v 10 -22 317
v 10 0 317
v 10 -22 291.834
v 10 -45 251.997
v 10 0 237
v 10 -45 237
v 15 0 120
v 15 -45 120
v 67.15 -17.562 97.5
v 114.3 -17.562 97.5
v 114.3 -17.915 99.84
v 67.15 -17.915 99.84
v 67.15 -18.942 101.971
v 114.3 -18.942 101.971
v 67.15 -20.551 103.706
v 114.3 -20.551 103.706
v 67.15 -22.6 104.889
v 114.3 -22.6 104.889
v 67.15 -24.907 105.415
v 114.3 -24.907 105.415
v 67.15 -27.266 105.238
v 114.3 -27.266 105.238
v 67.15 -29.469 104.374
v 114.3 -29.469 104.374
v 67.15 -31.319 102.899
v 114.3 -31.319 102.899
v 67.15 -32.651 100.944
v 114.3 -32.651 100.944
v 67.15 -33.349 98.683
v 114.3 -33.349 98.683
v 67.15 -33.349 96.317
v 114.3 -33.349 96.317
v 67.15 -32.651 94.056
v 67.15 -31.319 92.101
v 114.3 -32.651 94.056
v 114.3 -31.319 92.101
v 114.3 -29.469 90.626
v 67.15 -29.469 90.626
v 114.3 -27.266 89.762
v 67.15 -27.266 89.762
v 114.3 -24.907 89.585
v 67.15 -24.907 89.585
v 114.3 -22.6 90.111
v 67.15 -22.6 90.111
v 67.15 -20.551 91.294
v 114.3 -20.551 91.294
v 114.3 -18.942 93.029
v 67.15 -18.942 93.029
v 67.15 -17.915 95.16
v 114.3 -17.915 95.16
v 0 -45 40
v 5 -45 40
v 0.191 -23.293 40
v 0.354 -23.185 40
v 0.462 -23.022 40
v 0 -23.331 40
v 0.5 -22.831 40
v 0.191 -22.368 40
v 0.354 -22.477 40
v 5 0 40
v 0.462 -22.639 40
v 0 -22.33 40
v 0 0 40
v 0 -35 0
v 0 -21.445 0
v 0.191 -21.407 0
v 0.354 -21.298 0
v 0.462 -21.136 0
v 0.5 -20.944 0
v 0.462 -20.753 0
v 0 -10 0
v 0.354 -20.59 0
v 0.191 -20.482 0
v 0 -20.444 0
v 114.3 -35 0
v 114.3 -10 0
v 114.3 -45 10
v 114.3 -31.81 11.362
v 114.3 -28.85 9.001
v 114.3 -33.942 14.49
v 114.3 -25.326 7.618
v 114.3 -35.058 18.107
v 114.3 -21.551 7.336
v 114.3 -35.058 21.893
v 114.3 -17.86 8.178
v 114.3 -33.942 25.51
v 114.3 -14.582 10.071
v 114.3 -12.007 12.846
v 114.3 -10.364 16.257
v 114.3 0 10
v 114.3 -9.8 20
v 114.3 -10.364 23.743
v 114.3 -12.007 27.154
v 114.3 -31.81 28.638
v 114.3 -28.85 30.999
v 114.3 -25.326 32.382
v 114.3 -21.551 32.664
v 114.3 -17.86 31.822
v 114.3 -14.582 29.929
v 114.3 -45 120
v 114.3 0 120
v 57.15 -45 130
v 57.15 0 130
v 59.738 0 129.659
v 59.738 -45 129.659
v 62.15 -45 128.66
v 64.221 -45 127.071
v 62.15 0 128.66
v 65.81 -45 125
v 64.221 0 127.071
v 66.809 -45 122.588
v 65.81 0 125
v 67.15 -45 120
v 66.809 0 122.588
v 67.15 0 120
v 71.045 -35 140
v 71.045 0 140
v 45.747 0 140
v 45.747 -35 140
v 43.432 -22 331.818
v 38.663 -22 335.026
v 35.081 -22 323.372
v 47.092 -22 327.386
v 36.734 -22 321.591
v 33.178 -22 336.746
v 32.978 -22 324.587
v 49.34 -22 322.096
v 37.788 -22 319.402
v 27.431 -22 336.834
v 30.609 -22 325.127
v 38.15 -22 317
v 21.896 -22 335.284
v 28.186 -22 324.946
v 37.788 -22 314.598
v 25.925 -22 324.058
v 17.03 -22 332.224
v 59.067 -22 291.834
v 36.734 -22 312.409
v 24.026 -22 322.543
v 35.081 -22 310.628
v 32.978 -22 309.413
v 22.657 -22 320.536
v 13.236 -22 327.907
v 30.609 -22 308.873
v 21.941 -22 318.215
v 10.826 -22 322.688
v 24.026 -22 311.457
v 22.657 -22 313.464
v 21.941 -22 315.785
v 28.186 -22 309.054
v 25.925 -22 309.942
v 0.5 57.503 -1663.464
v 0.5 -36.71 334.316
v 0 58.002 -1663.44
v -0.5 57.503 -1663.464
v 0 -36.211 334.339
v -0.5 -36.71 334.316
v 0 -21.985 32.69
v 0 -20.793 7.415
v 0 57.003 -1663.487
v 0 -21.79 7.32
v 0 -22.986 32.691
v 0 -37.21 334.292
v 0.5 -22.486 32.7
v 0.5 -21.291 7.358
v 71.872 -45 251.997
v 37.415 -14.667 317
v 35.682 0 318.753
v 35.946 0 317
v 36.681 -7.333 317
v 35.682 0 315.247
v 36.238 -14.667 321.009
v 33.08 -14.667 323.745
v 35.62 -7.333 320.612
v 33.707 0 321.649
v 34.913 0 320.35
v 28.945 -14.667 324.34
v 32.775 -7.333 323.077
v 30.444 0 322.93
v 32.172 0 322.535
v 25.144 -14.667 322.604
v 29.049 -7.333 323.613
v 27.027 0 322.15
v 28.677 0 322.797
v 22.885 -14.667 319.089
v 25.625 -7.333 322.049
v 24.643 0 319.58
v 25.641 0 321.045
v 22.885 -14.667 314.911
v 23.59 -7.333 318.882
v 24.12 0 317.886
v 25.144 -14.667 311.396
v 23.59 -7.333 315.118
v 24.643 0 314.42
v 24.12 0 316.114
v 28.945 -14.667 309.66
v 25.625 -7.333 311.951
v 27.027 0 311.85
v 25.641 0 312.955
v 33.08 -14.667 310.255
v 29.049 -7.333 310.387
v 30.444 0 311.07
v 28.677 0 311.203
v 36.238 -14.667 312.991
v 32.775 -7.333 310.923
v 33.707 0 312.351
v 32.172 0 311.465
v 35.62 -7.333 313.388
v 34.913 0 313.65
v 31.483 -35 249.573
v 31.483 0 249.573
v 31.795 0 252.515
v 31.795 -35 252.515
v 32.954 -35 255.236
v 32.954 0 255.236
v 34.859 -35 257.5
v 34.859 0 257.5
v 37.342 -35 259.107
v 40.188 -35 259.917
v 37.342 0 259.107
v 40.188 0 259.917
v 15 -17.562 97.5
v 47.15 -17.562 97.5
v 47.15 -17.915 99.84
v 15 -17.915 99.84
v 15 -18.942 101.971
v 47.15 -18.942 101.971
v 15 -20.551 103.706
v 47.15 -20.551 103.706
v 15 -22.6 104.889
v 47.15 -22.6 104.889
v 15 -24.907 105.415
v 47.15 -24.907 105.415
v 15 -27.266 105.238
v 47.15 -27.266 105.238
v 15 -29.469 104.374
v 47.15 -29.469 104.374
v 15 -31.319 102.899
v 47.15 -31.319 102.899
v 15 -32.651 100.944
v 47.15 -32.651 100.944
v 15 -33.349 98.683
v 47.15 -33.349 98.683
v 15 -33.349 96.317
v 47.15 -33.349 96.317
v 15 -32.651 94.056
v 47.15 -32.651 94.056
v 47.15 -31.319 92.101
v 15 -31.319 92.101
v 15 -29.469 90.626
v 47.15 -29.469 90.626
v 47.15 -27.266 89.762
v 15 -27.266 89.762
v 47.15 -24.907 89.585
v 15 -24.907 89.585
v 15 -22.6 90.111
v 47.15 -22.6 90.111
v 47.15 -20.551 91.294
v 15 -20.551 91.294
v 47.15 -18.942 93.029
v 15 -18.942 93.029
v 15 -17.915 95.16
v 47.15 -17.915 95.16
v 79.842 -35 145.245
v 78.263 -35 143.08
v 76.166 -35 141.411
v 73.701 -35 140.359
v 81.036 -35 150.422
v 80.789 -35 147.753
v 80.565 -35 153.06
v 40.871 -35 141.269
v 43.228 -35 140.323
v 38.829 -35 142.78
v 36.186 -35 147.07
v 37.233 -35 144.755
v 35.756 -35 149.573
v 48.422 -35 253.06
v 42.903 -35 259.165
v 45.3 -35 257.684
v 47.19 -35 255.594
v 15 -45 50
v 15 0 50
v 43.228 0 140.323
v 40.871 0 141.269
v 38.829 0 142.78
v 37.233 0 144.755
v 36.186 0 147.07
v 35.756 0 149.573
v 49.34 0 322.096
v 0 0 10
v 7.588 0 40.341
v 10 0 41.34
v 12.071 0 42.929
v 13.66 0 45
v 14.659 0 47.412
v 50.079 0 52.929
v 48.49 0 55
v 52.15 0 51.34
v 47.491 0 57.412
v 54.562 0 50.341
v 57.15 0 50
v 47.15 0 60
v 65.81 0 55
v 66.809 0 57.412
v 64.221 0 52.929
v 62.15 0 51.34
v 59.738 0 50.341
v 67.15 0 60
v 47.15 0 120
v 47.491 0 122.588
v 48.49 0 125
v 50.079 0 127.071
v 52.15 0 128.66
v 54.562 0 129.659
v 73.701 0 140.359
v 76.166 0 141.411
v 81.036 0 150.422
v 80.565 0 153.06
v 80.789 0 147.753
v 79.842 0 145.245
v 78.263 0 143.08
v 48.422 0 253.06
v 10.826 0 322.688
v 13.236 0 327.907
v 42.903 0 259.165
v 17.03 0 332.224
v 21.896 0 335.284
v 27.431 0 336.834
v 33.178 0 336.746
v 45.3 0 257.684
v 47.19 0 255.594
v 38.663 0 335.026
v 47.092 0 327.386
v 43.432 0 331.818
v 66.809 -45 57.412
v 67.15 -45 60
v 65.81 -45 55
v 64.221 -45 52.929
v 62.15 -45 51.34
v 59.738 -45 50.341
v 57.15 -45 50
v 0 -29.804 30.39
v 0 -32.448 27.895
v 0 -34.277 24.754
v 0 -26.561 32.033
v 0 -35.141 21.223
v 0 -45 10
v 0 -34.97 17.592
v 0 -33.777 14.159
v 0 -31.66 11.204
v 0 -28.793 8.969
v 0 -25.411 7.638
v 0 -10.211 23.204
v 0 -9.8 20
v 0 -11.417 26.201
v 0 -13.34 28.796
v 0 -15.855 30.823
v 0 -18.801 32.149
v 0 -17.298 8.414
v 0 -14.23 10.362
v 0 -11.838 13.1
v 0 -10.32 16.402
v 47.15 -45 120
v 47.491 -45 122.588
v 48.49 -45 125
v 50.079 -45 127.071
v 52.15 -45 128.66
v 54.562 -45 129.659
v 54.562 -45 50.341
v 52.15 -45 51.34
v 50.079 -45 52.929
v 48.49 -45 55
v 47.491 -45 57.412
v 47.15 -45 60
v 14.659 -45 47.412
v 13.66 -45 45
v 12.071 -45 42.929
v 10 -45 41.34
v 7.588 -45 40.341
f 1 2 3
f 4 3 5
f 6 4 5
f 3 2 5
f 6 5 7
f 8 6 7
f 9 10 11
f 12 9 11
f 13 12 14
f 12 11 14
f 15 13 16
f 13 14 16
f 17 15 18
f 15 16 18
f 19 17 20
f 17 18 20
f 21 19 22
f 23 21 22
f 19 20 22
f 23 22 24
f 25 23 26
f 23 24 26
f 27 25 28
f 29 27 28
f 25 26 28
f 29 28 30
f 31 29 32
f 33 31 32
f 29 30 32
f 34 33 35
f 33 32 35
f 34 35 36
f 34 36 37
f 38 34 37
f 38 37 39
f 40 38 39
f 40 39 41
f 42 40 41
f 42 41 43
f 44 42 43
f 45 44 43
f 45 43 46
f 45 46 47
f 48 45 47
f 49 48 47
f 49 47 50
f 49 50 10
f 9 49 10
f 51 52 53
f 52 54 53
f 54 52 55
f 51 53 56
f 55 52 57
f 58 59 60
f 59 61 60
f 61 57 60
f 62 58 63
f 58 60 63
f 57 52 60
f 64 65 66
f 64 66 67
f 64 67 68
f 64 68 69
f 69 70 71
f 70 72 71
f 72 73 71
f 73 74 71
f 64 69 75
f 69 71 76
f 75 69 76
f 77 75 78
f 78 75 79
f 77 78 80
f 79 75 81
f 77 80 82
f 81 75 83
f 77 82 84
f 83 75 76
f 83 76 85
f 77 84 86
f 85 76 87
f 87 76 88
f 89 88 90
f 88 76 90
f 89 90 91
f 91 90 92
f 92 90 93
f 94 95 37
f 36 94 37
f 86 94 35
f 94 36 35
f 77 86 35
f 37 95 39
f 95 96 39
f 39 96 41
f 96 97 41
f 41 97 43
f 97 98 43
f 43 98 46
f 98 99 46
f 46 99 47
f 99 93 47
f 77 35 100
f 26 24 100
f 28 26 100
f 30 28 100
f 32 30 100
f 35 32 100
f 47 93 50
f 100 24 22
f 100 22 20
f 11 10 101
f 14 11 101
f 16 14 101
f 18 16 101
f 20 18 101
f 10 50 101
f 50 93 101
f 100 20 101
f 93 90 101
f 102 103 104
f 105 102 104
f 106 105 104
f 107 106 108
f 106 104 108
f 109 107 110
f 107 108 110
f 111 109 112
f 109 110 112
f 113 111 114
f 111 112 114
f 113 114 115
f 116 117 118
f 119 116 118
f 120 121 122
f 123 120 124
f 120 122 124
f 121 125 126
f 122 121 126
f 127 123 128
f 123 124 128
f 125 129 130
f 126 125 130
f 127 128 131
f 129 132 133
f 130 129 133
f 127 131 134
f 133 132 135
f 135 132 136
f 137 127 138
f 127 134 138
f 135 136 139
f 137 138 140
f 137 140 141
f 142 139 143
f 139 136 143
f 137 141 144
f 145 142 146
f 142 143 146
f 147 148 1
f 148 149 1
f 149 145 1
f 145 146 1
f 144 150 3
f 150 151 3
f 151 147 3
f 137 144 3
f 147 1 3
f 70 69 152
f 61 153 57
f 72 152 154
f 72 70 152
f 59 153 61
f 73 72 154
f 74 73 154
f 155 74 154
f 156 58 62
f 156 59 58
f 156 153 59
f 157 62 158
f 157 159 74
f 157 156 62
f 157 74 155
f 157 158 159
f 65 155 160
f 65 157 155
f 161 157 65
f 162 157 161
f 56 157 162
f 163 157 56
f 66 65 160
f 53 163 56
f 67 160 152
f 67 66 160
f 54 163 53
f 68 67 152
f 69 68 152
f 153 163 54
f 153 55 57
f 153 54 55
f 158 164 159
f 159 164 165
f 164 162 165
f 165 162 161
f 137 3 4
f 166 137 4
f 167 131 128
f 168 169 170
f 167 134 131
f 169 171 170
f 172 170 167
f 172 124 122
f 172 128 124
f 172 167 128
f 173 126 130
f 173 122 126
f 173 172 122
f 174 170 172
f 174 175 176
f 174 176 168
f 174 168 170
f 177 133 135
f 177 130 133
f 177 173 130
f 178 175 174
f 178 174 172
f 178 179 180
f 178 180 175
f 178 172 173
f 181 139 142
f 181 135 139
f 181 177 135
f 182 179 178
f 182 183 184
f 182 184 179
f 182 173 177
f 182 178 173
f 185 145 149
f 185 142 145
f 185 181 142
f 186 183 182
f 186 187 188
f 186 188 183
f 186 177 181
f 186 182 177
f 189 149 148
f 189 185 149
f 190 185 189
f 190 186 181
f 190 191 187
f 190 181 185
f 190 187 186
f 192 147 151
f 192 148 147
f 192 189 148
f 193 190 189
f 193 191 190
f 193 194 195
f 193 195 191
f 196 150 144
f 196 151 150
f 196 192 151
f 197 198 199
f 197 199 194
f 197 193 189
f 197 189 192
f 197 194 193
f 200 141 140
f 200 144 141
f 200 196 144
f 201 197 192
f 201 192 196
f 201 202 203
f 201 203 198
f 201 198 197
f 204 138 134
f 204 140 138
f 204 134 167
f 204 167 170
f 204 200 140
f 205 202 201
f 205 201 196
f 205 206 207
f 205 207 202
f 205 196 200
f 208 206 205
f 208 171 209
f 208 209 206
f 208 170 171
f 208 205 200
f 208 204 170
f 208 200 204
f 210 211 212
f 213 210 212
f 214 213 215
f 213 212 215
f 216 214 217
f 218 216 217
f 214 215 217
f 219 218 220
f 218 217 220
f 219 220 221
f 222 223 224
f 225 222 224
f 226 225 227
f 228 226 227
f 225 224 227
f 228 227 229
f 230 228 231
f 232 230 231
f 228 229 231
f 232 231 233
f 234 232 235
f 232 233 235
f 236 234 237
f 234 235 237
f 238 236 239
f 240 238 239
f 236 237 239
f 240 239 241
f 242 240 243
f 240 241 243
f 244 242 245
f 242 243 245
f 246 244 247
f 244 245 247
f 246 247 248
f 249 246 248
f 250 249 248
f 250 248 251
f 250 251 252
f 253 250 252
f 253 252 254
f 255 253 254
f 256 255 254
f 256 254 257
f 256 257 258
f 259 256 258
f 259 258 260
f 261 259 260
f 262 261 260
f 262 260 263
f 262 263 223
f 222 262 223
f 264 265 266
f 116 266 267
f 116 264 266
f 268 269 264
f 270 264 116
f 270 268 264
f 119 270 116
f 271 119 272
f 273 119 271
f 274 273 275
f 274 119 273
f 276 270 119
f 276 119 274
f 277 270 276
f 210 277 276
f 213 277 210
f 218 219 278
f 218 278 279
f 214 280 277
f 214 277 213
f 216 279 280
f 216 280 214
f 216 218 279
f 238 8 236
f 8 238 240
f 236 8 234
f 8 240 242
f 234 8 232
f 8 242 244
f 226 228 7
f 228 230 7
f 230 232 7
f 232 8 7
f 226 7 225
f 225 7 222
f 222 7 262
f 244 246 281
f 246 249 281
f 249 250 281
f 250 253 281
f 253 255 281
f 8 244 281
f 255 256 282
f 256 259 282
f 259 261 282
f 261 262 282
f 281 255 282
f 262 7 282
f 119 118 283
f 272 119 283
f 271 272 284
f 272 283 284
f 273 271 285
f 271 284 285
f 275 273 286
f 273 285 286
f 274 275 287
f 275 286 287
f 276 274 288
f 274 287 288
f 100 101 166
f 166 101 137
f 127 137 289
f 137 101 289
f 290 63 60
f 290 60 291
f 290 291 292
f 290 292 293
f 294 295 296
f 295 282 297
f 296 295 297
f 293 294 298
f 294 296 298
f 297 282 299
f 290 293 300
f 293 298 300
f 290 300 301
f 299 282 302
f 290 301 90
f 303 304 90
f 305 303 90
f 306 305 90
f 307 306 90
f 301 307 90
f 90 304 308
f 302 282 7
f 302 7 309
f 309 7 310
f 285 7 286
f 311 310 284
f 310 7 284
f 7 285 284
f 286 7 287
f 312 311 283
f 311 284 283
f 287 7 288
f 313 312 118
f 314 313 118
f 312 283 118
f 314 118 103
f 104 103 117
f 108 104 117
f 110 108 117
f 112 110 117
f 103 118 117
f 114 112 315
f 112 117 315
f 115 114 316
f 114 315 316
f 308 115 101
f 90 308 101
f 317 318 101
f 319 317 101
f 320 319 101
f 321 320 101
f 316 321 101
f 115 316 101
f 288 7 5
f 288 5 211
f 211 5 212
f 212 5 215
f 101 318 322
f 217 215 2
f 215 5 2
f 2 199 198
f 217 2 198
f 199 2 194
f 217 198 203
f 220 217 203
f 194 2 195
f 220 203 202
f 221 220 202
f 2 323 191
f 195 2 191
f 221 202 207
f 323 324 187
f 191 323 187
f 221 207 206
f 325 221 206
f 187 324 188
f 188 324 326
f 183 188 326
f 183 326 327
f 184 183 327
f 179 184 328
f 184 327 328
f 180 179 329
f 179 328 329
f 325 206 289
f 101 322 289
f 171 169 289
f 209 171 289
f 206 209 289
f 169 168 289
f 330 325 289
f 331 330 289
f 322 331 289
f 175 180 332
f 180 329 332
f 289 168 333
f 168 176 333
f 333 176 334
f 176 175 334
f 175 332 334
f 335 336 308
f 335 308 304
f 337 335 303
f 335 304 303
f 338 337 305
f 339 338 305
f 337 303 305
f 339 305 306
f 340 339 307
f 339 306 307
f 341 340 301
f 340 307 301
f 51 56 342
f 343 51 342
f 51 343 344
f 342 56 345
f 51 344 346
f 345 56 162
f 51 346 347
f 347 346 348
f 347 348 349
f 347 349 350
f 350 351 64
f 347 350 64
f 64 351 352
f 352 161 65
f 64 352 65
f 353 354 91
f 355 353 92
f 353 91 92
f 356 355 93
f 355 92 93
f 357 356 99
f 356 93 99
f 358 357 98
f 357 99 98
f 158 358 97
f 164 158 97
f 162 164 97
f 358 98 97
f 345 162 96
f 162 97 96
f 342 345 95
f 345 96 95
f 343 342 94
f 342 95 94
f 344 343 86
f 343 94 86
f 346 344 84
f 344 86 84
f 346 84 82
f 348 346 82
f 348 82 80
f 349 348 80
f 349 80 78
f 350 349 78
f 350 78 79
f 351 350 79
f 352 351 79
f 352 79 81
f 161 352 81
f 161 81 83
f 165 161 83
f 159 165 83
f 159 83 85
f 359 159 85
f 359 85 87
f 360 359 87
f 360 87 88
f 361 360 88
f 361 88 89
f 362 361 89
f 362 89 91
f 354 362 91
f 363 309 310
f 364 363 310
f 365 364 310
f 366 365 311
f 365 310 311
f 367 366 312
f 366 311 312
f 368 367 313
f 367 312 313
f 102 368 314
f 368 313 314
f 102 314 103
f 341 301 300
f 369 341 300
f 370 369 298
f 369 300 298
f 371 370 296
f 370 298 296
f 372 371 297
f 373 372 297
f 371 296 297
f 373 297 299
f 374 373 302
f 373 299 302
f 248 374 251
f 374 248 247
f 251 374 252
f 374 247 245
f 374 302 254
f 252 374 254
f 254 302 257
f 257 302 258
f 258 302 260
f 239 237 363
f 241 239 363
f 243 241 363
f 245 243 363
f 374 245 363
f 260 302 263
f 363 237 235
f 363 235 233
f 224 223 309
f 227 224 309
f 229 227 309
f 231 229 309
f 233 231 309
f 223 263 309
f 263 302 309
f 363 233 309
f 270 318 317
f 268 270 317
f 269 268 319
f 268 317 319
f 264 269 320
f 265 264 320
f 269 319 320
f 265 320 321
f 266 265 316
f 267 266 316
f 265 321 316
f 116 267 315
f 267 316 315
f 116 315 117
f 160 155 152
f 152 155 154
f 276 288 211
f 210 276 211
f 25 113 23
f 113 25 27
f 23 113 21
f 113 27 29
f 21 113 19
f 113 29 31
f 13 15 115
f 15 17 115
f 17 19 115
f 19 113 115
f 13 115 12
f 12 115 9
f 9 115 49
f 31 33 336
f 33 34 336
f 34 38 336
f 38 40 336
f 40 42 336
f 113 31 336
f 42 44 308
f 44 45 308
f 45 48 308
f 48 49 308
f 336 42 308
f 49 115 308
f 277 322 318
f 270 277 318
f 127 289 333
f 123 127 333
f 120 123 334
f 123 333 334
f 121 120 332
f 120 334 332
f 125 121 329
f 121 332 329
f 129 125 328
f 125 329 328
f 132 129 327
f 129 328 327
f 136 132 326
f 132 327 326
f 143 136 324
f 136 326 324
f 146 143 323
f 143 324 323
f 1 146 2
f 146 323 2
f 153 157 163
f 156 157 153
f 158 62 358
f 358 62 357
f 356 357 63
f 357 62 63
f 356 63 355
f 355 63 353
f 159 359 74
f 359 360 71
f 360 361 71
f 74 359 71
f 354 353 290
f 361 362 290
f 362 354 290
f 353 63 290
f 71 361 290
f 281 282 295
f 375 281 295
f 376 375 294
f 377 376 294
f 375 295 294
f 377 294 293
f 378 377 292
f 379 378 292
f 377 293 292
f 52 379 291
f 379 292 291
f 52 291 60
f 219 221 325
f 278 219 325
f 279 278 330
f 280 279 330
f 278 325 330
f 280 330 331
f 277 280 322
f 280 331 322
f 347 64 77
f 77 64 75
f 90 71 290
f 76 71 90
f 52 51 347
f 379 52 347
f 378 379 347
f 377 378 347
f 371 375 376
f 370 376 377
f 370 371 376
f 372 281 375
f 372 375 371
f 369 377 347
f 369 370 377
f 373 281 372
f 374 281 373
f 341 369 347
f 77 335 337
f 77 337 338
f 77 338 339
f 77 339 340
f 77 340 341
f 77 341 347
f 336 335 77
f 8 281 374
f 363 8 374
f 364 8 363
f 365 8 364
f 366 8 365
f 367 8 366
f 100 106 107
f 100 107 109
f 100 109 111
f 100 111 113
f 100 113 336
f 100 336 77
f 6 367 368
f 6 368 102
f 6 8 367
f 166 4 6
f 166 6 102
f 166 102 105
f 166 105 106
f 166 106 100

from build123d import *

# Parameters (mm, degrees)
F0_R      = 2.5
F1_DEPTH  = 45
F2_R      = 7.9375
F2_R_2    = 12.7
F3_DEPTH  = 114.301
F5_DEPTH  = 35
F7_DEPTH  = 114.301
F8_SIZE   = 10
F9_R      = 8.15
F10_DEPTH = 25
F10_TAPER = 5.72
F13_R     = 0.5
F14_DEPTH = 2000


with BuildPart() as f1:
    # F0 (on Front) → F1 (new body)
    with BuildSketch(Plane.XZ):
        with BuildLine():
            Line((0, 40), (0, 0))
            Line((0, 0), (114.3, 0))
            Line((114.3, 0), (114.3, 120))
            Line((114.3, 120), (49.3399335472, 322.0957796647))
            ThreePointArc((49.3399335472, 322.0957796647), (27.4308241539, 336.8342969493), (10, 317))
            Line((10, 317), (10, 237))
            Line((10, 237), (15, 120))
            Line((15, 120), (15, 50))
            ThreePointArc((15, 50), (12.0710678119, 42.9289321881), (5, 40))
            Line((5, 40), (0, 40))
        make_face()
        with BuildLine():
            ThreePointArc((57.15, 130), (64.2210678119, 127.0710678119), (67.15, 120))
            Line((67.15, 120), (67.15, 60))
            ThreePointArc((67.15, 60), (64.2210678119, 52.9289321881), (57.15, 50))
            ThreePointArc((57.15, 50), (50.0789321881, 52.9289321881), (47.15, 60))
            Line((47.15, 60), (47.15, 120))
            ThreePointArc((47.15, 120), (50.0789321881, 127.0710678119), (57.15, 130))
        make_face(mode=Mode.SUBTRACT)
        with Locations((30, 317)):
            Circle(F0_R, mode=Mode.SUBTRACT)
    extrude(amount=F1_DEPTH)

    # F2 (on face) → F3 (cut, through all)
    with BuildSketch(Plane.YZ.offset(114.3)):
        with Locations((-25.5, 97.5)):
            Circle(F2_R)
        with Locations((-22.5, 20)):
            Circle(F2_R_2)
    extrude(amount=-F3_DEPTH, mode=Mode.SUBTRACT)

    # F4 (on face) → F5 (cut)
    with BuildSketch(Plane(origin=(0, 0, 0), x_dir=(-1, 0, 0), z_dir=(0, 1, 0))):
        with BuildLine():
            Line((-48.4216344216, 253.0601220633), (-80.5648422415, 153.0601220633))
            ThreePointArc((-80.5648422415, 153.0601220633), (-79.1254456583, 144.1093812139), (-71.0445663549, 140))
            Line((-71.0445663549, 140), (-45.7471559309, 140))
            ThreePointArc((-45.7471559309, 140), (-38.828688156, 142.7795565477), (-35.7562748619, 149.5730392706))
            Line((-35.7562748619, 149.5730392706), (-31.4827705884, 249.5730392706))
            ThreePointArc((-31.4827705884, 249.5730392706), (-33.8223810432, 256.438793209), (-40.1875050962, 259.9169464566))
            ThreePointArc((-40.1875050962, 259.9169464566), (-45.300475796, 257.6844842559), (-48.4216344216, 253.0601220633))
        make_face()
    extrude(amount=-F5_DEPTH, mode=Mode.SUBTRACT)

    # F6 (on face) → F7 (cut, through all)
    with BuildSketch(Plane(origin=(0, 0, 0), x_dir=(0, -1, 0), z_dir=(-1, 0, 0))):
        Polygon((75.7247351185, 458.4947787785), (22, 458.4947787785), (22, 291.8342969493), (75.7247351185, 198.7803261009), align=None)
    extrude(amount=-F7_DEPTH, mode=Mode.SUBTRACT)

    # F8
    f8_edges = [f1.edges().sort_by_distance(p)[0] for p in [
        (57.15, 0, 0),
        (57.15, -45, 0),
    ]]
    chamfer(f8_edges, length=F8_SIZE)

    # F9 (on face) → F10 (cut)
    with BuildSketch(Plane.XZ.offset(22)):
        with Locations((30, 317)):
            Circle(F9_R)
    extrude(amount=-F10_DEPTH, taper=F10_TAPER, mode=Mode.SUBTRACT)

    # F13 (on line) → F14 (join)
    with BuildSketch(Plane(origin=(0, -15.8124107275, 335.3013597184), x_dir=(1, 0, 0), z_dir=(0, -0.0471064507, 0.998889875))):
        with Locations((0, -20.920984447)):
            Circle(F13_R)
    extrude(amount=-F14_DEPTH)


solid = f1.part
